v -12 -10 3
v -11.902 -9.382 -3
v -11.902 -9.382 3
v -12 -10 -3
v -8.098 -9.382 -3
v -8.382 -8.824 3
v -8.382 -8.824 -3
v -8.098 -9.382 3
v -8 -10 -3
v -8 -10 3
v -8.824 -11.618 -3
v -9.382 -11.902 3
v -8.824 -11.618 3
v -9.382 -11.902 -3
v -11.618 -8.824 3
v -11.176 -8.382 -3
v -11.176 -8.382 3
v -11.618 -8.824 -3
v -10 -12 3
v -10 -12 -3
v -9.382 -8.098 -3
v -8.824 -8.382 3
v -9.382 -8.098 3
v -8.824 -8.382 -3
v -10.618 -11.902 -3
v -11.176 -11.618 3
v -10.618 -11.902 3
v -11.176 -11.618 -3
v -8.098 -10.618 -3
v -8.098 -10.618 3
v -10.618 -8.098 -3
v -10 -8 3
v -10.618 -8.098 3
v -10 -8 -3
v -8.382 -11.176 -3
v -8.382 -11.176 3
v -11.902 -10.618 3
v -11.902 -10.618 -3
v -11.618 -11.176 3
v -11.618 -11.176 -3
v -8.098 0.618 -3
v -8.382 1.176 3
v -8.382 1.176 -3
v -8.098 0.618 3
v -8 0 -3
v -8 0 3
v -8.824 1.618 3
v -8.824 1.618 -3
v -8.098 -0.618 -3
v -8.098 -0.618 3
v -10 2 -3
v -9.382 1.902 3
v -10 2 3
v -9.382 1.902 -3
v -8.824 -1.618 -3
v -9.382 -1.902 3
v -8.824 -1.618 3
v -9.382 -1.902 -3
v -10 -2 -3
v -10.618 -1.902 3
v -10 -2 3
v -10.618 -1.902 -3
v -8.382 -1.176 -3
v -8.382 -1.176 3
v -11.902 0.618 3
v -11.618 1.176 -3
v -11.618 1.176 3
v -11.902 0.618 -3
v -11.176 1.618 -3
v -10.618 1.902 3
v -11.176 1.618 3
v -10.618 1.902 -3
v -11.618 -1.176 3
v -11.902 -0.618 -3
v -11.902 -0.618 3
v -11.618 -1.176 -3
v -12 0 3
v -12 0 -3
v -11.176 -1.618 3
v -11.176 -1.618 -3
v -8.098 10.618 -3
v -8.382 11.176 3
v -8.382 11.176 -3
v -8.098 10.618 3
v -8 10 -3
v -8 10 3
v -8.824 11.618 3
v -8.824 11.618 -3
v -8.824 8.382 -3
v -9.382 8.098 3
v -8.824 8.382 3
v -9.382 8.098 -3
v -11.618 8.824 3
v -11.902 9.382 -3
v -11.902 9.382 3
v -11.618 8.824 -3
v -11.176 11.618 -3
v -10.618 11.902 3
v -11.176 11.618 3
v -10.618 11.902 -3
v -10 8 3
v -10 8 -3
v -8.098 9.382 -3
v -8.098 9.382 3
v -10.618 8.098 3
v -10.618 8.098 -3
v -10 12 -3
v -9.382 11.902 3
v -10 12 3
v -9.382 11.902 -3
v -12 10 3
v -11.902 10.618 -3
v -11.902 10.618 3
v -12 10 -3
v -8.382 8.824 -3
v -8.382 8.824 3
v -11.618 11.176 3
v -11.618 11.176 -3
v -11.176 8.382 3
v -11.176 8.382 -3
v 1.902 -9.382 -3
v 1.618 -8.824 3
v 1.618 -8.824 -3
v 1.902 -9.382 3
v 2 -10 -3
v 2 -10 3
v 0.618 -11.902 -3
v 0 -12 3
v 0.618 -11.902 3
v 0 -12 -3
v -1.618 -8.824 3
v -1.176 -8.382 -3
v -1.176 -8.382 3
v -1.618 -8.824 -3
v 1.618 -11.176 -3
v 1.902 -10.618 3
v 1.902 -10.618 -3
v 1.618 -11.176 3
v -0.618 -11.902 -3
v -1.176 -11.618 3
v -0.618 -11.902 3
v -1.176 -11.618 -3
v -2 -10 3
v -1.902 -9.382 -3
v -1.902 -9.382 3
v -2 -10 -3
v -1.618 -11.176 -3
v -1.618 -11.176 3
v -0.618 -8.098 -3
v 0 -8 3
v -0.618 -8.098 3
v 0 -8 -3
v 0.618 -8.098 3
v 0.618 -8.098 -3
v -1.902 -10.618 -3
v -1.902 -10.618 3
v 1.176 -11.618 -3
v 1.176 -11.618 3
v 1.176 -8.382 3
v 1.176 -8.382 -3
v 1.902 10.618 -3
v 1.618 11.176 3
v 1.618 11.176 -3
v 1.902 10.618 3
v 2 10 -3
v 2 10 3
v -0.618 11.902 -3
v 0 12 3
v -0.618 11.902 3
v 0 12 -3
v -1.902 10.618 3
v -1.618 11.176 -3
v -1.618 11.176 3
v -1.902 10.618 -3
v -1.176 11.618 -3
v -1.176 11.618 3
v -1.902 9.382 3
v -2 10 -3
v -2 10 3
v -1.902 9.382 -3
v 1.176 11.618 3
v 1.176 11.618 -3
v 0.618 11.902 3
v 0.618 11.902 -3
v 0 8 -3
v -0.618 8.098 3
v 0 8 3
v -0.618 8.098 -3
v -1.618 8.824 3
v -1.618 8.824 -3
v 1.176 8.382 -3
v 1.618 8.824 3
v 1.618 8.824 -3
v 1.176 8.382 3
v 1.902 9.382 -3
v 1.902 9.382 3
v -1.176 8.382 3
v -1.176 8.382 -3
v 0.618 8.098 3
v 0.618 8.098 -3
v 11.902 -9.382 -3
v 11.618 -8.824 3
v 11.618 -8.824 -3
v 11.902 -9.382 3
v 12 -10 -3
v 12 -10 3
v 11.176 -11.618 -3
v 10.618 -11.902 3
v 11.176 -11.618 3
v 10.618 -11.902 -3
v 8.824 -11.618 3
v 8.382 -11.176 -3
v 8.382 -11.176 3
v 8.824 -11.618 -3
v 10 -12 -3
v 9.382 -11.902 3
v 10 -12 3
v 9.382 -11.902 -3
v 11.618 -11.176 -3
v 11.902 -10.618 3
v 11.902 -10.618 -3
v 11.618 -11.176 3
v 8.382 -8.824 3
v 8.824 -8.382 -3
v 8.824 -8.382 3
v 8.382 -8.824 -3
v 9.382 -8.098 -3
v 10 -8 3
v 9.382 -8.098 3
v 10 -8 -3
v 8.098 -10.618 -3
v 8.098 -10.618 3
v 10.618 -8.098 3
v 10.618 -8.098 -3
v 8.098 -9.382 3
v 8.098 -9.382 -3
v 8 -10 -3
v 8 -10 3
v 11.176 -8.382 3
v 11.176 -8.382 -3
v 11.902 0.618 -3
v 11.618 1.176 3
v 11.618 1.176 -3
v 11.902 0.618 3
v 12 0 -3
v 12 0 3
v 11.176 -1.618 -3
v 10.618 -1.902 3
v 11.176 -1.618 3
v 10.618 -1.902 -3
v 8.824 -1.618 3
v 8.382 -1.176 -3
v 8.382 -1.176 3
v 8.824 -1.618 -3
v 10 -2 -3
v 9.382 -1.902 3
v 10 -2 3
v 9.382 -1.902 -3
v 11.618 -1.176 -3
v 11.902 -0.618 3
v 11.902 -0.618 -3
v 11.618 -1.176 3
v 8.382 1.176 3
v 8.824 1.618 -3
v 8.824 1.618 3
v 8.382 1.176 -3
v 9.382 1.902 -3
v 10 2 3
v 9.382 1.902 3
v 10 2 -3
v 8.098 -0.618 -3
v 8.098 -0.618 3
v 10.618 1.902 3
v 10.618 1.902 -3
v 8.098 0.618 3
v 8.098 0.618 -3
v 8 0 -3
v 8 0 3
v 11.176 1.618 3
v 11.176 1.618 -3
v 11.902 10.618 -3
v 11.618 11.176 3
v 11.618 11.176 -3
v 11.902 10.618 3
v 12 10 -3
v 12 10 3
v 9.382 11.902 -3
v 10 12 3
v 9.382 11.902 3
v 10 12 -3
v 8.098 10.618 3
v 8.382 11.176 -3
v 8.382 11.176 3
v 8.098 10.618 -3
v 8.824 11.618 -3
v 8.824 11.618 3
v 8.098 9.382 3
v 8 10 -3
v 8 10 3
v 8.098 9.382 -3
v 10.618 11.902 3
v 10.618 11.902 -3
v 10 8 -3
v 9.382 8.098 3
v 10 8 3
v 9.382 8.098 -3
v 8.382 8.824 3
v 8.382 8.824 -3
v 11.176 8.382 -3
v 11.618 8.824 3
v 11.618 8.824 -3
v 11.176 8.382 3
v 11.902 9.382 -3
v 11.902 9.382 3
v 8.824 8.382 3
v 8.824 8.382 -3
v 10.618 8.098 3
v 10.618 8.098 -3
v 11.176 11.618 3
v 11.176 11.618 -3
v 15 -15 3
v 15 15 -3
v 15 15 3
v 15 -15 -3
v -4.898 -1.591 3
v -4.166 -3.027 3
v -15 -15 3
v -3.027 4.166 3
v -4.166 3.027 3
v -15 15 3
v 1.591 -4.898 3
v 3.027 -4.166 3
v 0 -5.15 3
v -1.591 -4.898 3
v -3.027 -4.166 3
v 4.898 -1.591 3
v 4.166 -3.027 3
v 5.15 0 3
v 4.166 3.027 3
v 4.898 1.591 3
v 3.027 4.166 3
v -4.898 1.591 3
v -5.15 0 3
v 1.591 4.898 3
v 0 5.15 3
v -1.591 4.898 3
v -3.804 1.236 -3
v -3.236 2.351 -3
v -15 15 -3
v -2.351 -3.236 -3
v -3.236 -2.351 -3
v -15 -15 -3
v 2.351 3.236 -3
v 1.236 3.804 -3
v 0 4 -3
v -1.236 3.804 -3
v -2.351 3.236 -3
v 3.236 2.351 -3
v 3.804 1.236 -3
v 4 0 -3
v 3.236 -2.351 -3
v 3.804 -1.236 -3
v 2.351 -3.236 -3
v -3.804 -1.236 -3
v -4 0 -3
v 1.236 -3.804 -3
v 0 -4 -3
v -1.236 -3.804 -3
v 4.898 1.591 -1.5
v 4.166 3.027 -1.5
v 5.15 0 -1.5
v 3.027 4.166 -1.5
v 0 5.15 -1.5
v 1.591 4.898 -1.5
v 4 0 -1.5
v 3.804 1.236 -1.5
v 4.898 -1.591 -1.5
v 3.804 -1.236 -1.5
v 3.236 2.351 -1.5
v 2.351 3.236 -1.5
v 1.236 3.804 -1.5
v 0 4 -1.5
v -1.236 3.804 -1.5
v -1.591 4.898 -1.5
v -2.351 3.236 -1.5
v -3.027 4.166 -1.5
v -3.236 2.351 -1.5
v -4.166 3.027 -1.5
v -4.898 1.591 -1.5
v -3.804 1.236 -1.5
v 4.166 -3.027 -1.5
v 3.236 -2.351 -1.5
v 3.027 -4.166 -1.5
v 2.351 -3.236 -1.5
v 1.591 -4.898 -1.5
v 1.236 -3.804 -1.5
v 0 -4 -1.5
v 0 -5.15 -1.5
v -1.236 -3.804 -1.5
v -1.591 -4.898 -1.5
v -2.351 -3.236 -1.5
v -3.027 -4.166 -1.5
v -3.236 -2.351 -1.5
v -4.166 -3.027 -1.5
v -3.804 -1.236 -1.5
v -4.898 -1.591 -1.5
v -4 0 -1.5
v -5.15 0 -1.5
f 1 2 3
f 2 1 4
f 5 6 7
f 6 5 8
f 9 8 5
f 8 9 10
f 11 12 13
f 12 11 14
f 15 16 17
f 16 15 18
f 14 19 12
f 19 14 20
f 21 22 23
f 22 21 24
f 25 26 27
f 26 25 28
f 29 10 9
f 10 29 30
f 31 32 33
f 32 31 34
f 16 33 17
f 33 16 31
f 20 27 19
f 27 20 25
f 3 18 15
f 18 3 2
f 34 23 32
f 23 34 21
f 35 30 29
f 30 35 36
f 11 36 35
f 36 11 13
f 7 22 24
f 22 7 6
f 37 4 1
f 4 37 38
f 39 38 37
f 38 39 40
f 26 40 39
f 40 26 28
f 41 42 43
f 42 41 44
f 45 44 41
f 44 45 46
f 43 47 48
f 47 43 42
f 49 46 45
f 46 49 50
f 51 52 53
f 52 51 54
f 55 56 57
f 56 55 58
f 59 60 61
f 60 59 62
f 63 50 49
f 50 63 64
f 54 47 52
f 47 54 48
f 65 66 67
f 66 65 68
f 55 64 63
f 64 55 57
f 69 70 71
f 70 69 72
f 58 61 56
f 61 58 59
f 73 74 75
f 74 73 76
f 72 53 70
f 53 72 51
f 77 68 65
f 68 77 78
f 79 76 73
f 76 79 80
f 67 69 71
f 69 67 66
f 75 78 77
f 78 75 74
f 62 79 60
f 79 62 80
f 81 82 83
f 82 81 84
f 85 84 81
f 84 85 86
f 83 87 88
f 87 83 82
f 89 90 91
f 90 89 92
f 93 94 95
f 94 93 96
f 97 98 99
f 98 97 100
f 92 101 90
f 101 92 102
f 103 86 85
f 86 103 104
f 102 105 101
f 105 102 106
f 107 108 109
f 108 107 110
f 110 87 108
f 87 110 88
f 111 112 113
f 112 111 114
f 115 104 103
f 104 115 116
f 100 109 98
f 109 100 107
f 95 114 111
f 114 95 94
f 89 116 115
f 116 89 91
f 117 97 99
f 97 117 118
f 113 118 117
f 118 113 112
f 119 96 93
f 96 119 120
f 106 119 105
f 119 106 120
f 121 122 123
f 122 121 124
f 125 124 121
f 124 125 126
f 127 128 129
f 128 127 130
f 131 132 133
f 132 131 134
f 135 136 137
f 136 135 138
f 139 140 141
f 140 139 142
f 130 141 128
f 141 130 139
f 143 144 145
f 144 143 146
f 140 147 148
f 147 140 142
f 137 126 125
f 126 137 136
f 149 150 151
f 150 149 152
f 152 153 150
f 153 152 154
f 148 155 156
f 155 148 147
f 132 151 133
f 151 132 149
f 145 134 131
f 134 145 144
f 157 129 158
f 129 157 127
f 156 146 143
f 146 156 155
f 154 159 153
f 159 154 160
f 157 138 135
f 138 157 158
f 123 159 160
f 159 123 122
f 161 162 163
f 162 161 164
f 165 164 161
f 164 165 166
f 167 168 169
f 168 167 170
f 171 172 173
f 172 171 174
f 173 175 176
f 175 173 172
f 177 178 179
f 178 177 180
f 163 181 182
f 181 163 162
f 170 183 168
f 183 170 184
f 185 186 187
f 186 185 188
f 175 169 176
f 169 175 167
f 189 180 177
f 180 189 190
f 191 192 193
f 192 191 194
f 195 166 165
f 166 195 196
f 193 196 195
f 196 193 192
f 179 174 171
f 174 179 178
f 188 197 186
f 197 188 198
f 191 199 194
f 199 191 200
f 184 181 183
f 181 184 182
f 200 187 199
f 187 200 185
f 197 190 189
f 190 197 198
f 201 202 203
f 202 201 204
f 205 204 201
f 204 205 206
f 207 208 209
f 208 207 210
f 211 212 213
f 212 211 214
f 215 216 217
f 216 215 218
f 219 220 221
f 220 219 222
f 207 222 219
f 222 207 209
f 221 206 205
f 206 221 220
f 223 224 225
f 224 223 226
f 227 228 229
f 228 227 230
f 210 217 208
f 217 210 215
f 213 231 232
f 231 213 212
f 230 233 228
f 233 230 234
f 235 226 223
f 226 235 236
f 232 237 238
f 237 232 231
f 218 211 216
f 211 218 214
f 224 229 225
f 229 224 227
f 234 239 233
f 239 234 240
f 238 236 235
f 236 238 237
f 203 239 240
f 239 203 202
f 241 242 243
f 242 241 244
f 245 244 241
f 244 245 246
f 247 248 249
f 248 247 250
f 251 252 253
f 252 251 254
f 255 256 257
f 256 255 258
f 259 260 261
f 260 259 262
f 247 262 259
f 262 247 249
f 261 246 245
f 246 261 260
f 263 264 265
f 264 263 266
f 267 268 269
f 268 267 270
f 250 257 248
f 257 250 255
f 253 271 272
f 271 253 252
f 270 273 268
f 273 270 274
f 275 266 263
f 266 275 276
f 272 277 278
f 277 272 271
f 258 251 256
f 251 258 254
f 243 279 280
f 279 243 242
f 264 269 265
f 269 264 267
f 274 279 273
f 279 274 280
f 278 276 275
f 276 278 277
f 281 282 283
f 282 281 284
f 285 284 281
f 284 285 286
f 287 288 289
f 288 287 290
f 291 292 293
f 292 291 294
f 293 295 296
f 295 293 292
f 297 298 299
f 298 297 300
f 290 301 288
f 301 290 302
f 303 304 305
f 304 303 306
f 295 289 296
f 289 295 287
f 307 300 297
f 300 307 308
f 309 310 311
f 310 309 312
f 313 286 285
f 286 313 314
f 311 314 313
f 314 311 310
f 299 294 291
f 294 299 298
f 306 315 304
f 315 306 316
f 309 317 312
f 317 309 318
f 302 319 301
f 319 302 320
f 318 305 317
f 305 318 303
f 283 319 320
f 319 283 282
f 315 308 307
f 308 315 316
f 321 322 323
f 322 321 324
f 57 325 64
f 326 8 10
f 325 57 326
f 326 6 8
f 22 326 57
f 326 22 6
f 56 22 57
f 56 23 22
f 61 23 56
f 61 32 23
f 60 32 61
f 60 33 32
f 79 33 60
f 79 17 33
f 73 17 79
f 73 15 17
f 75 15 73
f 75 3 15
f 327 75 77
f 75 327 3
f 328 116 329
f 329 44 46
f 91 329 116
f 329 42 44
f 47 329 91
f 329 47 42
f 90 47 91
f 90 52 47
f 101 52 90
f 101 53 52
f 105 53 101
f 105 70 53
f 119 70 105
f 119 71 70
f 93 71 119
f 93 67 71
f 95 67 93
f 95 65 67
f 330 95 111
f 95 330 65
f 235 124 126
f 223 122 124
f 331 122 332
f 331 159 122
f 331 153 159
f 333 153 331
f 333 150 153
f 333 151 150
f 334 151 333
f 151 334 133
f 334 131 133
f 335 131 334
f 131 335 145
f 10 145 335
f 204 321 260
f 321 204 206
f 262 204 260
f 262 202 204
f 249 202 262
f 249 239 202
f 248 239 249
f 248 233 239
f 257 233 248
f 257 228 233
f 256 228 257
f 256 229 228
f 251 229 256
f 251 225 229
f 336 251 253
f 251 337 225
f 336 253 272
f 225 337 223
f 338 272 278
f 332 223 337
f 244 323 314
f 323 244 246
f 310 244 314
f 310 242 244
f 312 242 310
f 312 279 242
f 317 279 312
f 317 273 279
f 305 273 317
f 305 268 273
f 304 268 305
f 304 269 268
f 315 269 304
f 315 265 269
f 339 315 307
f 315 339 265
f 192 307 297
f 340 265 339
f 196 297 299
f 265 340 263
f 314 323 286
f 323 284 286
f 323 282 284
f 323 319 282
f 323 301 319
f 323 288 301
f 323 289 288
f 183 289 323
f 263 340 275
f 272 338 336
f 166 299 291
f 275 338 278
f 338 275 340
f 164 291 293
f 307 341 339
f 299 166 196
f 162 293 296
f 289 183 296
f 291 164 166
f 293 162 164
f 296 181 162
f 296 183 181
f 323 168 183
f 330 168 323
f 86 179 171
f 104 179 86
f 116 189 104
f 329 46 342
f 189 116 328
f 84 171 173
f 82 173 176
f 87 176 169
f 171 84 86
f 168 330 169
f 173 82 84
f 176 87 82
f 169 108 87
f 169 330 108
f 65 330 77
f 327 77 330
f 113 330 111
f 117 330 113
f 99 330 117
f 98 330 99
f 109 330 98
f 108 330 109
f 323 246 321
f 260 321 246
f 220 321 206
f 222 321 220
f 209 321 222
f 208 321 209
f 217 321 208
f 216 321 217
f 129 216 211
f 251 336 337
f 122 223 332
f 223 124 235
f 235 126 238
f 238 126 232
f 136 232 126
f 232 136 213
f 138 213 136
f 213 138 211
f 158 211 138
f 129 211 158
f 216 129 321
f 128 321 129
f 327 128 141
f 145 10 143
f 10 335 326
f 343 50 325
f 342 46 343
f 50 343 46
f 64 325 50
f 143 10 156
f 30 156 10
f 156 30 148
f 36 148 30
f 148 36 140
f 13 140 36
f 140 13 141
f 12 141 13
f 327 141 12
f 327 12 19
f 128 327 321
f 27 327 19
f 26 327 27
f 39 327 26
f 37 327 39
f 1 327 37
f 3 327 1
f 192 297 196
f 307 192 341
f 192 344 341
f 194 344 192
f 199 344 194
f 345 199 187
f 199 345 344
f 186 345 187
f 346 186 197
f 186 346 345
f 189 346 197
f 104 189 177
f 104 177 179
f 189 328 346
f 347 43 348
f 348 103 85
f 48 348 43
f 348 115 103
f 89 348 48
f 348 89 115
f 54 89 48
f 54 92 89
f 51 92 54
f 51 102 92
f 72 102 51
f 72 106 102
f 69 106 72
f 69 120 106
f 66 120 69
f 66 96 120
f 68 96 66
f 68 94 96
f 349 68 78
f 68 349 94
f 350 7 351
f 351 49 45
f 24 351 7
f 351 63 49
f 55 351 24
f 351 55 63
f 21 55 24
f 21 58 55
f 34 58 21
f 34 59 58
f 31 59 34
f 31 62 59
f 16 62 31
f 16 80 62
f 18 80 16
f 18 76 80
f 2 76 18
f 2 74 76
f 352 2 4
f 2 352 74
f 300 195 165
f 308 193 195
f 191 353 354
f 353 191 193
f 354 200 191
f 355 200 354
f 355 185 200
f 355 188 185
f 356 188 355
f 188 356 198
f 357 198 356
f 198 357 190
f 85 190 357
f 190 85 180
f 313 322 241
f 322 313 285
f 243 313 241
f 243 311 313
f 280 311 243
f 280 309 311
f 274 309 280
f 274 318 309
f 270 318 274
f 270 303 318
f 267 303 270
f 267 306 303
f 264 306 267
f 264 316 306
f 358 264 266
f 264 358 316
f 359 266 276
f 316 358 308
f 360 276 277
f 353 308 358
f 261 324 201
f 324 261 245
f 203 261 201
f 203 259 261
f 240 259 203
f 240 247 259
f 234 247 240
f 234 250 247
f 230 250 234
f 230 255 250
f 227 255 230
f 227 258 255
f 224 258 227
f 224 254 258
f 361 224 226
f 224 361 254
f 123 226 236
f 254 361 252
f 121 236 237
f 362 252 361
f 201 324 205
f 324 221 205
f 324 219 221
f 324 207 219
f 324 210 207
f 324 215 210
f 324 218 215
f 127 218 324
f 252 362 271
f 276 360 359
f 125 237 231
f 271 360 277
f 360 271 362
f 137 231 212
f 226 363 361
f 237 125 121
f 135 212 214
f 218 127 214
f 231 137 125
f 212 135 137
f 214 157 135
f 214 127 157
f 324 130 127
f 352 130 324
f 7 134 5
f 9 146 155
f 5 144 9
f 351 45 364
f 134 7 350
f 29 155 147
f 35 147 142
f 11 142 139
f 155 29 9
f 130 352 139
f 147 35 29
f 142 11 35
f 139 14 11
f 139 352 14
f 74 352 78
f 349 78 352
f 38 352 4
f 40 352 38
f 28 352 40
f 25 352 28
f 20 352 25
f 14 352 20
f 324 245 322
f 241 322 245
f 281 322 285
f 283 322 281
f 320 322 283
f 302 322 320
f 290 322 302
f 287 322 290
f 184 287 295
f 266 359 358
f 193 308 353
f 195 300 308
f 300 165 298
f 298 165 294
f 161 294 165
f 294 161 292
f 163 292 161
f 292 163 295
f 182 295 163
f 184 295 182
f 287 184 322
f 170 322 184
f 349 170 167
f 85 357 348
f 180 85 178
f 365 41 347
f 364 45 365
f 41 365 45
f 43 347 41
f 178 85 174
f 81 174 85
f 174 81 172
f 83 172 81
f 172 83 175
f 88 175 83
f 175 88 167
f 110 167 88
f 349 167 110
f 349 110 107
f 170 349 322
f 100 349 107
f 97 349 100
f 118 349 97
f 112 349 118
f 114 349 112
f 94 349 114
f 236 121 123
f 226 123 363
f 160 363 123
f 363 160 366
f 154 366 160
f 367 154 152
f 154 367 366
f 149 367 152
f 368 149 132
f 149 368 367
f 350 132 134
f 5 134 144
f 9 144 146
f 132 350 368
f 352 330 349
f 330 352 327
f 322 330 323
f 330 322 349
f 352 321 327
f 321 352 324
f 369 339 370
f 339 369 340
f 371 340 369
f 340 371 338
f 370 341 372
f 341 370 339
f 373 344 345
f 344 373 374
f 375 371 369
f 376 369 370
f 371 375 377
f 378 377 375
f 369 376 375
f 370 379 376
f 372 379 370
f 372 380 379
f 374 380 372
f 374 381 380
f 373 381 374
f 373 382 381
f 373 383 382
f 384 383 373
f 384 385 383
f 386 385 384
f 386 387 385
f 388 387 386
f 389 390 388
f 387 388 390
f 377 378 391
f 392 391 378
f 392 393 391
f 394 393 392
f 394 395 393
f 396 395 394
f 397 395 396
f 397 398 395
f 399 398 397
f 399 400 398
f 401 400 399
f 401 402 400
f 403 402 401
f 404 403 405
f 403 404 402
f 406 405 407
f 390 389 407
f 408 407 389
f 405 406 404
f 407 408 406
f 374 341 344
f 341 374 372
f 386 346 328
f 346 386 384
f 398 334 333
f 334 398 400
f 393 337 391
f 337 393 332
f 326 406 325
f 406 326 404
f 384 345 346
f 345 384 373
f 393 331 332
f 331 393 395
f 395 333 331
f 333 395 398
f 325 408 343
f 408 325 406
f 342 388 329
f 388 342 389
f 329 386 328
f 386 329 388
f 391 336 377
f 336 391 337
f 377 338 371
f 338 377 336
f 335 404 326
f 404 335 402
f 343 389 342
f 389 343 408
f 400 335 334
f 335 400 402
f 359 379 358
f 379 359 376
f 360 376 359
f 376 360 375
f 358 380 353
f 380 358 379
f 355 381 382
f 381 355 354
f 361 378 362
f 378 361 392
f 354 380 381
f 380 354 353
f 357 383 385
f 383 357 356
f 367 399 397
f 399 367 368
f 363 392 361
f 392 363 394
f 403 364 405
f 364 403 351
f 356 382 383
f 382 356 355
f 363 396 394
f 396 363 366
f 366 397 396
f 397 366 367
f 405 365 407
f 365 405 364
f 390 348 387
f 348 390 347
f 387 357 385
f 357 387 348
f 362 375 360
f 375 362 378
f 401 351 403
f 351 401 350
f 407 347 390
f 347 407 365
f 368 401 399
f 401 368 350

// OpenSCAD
// holder for M3 bearing with 3x3 plate
$fn = 20;
d_o = 10.3;
d_o1 = 8;
r_ho = 2.0;

z_b = 5;
z_1 = 1;
z_a = z_b + z_1;

x_1 = 30;

y_1 = 30;

step_xy = 10;

module m_hole( i, j )
{
  translate([ i*step_xy, j*step_xy,z_1])  cylinder(h=2*z_a, r = r_ho, center = true );
}

module bearing_box()
{
  difference() {
    cube([x_1,y_1,z_a], true );
    translate([0,0,z_1])
      cylinder(h=z_b, r = d_o/2.0, center = true );
    translate([0,0,z_1])
      cylinder(h=2*z_a, r = d_o1/2.0, center = true );

    for( i=[-1:1:1]) {
      for( j=[-1:1:1]) {
        m_hole( i, j );
      }
    };
  }
}

bearing_box();
